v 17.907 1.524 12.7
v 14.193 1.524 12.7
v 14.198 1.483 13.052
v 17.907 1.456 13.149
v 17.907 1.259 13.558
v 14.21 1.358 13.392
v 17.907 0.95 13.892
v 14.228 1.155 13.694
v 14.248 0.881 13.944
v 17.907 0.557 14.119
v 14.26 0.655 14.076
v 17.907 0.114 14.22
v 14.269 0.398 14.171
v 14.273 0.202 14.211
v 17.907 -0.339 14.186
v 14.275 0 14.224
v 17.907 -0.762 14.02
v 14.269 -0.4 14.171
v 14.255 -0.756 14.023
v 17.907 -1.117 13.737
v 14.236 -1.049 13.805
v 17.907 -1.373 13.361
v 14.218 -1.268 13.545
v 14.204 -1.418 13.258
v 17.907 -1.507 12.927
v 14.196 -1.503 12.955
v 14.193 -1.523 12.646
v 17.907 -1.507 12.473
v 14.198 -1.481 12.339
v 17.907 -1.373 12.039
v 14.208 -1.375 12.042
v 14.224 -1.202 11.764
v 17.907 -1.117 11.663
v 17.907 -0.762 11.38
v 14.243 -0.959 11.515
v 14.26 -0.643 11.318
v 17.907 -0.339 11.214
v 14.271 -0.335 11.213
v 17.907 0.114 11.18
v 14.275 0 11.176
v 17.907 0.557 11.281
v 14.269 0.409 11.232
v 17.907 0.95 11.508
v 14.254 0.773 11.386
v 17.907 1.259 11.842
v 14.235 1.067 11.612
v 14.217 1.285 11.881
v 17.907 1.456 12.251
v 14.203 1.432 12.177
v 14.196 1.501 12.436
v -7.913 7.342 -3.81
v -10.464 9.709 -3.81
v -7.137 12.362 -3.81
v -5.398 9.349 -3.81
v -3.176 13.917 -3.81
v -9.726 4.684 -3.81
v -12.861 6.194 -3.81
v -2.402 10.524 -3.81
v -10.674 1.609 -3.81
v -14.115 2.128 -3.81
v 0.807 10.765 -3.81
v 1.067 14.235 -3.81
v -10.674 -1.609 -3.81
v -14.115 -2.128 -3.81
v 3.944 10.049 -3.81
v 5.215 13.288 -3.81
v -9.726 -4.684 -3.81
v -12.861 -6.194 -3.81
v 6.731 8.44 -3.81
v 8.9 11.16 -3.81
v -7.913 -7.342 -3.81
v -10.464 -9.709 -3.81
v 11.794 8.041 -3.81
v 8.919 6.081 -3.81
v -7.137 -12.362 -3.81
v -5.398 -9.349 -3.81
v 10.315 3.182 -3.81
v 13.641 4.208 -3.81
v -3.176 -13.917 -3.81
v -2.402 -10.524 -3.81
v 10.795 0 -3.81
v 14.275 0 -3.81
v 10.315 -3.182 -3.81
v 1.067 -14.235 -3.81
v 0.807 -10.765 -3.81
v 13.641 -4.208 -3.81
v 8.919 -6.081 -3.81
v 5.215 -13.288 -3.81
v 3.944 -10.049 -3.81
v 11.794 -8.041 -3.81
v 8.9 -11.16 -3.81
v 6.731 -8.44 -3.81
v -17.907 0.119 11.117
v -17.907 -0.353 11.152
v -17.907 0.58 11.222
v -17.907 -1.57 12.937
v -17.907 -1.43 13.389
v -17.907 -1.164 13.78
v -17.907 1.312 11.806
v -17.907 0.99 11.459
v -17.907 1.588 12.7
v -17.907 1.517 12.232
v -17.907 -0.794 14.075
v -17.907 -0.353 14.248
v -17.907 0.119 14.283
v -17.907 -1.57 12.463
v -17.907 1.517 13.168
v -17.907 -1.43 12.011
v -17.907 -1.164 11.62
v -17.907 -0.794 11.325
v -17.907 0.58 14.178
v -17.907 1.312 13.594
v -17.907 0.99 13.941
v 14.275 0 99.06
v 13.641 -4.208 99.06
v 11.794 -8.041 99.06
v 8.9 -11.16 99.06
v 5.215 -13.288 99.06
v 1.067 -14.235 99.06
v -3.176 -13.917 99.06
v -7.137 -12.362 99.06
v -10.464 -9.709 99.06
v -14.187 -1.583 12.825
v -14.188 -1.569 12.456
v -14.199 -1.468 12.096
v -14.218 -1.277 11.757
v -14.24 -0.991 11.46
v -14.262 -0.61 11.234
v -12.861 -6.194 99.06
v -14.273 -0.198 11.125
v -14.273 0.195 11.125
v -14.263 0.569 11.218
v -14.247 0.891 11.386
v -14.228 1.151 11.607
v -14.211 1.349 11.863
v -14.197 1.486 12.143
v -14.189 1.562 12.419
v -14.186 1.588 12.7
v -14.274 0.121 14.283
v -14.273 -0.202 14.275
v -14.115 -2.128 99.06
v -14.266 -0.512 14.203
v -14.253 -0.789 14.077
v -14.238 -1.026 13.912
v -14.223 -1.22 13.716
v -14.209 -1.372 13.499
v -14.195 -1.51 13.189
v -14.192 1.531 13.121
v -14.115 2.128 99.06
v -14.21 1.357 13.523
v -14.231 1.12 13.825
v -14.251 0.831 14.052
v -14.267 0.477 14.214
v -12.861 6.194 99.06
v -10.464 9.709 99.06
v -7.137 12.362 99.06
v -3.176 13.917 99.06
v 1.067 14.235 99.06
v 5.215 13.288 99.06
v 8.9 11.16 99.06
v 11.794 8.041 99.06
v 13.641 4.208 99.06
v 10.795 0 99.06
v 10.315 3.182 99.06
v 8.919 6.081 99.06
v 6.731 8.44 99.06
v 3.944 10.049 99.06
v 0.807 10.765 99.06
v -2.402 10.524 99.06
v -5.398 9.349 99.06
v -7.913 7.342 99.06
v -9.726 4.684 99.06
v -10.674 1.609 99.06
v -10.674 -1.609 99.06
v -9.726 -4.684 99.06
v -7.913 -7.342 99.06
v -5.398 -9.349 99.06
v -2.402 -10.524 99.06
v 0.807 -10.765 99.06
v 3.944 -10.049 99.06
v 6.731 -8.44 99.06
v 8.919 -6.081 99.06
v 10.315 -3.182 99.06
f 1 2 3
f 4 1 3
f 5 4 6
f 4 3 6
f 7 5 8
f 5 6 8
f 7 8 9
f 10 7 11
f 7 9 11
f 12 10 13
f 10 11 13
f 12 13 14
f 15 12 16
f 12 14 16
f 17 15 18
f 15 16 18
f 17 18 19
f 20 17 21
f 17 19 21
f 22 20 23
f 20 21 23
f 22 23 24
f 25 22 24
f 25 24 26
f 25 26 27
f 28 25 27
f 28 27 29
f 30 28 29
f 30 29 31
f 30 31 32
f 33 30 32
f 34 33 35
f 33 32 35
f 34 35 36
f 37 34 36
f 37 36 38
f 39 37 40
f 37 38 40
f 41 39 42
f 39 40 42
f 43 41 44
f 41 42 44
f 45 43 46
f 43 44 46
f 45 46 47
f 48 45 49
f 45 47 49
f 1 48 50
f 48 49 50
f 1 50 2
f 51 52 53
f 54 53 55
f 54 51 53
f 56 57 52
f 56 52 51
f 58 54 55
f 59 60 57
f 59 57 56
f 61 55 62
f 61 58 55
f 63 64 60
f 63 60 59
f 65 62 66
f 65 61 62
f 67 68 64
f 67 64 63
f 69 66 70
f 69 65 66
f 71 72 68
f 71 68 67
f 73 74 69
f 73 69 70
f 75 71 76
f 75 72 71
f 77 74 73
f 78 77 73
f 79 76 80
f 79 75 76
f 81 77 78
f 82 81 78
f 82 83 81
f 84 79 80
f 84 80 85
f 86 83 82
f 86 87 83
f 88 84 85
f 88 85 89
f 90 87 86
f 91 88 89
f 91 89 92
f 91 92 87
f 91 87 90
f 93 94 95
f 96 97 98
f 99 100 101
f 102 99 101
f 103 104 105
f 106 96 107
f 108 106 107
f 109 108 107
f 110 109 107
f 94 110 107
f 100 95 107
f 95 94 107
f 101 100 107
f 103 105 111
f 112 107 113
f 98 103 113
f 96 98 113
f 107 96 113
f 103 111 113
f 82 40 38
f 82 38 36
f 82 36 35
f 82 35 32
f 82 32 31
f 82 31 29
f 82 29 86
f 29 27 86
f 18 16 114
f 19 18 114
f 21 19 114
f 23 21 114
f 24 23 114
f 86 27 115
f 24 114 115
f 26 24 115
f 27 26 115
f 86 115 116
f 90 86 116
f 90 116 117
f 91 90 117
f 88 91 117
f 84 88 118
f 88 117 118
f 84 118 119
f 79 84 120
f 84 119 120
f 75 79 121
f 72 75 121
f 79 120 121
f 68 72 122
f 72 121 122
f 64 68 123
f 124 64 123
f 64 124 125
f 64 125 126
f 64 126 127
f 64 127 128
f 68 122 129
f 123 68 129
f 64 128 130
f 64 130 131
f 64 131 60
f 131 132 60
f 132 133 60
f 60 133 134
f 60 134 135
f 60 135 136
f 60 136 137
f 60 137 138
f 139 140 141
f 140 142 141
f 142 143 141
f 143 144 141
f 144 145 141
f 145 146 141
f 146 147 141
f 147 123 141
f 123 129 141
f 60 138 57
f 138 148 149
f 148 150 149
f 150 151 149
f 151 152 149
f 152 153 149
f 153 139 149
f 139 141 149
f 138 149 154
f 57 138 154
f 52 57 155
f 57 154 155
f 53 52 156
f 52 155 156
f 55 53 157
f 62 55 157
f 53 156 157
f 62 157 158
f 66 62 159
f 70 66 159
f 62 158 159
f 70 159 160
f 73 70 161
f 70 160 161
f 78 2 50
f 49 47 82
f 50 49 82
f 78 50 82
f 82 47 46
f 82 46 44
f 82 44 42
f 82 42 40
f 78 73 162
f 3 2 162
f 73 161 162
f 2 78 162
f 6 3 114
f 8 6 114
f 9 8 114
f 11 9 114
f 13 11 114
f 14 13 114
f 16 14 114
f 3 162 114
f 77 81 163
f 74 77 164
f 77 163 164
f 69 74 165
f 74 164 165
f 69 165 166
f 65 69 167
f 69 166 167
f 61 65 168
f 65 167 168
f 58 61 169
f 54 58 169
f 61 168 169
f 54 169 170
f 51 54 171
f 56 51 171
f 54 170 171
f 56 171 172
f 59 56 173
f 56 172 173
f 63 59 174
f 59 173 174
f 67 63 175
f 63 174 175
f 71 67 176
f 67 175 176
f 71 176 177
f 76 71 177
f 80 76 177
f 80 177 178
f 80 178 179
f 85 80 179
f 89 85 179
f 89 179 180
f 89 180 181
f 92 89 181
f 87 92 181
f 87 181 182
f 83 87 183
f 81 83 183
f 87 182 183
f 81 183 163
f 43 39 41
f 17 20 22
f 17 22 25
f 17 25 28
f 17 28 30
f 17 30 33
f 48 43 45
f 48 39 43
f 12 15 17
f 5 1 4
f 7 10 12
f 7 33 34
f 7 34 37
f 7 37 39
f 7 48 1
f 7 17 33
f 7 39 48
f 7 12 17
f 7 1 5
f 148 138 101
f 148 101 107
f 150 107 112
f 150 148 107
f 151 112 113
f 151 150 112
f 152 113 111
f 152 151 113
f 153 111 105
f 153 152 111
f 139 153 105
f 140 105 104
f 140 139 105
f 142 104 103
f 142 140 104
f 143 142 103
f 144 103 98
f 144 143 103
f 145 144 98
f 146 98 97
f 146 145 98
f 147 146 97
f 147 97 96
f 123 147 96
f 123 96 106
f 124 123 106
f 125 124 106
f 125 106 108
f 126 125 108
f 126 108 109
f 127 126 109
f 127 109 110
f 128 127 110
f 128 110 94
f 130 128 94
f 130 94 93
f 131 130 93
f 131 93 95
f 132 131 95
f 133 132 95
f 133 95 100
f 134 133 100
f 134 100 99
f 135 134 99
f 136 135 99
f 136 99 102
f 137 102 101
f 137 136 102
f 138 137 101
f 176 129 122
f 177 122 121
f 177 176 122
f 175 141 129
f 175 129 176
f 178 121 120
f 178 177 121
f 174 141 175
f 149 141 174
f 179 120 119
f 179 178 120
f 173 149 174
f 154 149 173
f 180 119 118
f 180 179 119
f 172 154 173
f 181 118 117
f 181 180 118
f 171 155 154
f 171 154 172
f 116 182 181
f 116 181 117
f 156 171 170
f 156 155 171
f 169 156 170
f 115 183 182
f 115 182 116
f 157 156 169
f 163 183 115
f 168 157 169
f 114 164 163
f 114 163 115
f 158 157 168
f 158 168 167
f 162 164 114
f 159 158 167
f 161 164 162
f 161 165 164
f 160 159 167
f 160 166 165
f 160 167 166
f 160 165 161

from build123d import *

# Parameters (mm, degrees)
F0_R      = 14.2748
F0_R_2    = 12.827
F1_DEPTH  = 266.7
F3_DEPTH  = 12.7
F4_R      = 14.2748
F4_R_2    = 12.827
F5_DEPTH  = 76.2
F7_R      = 1.524
F8_DEPTH  = 5.08
F10_R     = 1.5875
F11_DEPTH = 5.08
F12_R     = 14.2875
F13_DEPTH = 256.54
F14_R     = 14.2748
F14_R_2   = 12.827
F15_DEPTH = 3.81
F16_R     = 14.2748
F16_R_2   = 10.795
F17_DEPTH = 102.87


with BuildPart() as f1:
    # F0 (on Top) → F1 (new body)
    with BuildSketch(Plane.XY):
        Circle(F0_R)
        Circle(F0_R_2, mode=Mode.SUBTRACT)
    extrude(amount=F1_DEPTH)

    # F2 (on face) → F3 (join)
    with BuildSketch(Plane.XY.offset(266.7)):
        with BuildLine():
            Line((-3.175, 12.4278438999), (-3.175, 13.9172299701))
            ThreePointArc((-3.175, 13.9172299701), (0, -14.2748), (3.175, 13.9172299701))
            Line((3.175, 13.9172299701), (3.175, 12.4278438999))
            ThreePointArc((3.175, 12.4278438999), (0, -12.827), (-3.175, 12.4278438999))
        make_face()
    extrude(amount=F3_DEPTH)

    # F4 (on face) → F5 (join)
    with BuildSketch(Plane.XY.offset(279.4)):
        Circle(F4_R)
        Circle(F4_R_2, mode=Mode.SUBTRACT)
    extrude(amount=F5_DEPTH)

    # F7 (on offset) → F8 (join)
    with BuildSketch(Plane.YZ.offset(12.827)):
        with Locations((0, 12.7)):
            Circle(F7_R)
    extrude(amount=F8_DEPTH)

    # F10 (on offset) → F11 (join)
    with BuildSketch(Plane.YZ.offset(-12.827)):
        with Locations((0, 12.7)):
            Circle(F10_R)
    extrude(amount=-F11_DEPTH)

    # F12 (on face) → F13 (cut)
    with BuildSketch(Plane.XY.offset(355.6)):
        Circle(F12_R)
    extrude(amount=-F13_DEPTH, mode=Mode.SUBTRACT)

    # F14 (on face) → F15 (join)
    with BuildSketch(Plane(origin=(0, 0, 0), x_dir=(1, 0, 0), z_dir=(0, 0, -1))):
        Circle(F14_R)
        Circle(F14_R_2, mode=Mode.SUBTRACT)
    extrude(amount=F15_DEPTH)

    # F16 (on face) → F17 (join)
    with BuildSketch(Plane.XY.offset(99.06)):
        Circle(F16_R)
        Circle(F16_R_2, mode=Mode.SUBTRACT)
    extrude(amount=-F17_DEPTH)


solid = f1.part
